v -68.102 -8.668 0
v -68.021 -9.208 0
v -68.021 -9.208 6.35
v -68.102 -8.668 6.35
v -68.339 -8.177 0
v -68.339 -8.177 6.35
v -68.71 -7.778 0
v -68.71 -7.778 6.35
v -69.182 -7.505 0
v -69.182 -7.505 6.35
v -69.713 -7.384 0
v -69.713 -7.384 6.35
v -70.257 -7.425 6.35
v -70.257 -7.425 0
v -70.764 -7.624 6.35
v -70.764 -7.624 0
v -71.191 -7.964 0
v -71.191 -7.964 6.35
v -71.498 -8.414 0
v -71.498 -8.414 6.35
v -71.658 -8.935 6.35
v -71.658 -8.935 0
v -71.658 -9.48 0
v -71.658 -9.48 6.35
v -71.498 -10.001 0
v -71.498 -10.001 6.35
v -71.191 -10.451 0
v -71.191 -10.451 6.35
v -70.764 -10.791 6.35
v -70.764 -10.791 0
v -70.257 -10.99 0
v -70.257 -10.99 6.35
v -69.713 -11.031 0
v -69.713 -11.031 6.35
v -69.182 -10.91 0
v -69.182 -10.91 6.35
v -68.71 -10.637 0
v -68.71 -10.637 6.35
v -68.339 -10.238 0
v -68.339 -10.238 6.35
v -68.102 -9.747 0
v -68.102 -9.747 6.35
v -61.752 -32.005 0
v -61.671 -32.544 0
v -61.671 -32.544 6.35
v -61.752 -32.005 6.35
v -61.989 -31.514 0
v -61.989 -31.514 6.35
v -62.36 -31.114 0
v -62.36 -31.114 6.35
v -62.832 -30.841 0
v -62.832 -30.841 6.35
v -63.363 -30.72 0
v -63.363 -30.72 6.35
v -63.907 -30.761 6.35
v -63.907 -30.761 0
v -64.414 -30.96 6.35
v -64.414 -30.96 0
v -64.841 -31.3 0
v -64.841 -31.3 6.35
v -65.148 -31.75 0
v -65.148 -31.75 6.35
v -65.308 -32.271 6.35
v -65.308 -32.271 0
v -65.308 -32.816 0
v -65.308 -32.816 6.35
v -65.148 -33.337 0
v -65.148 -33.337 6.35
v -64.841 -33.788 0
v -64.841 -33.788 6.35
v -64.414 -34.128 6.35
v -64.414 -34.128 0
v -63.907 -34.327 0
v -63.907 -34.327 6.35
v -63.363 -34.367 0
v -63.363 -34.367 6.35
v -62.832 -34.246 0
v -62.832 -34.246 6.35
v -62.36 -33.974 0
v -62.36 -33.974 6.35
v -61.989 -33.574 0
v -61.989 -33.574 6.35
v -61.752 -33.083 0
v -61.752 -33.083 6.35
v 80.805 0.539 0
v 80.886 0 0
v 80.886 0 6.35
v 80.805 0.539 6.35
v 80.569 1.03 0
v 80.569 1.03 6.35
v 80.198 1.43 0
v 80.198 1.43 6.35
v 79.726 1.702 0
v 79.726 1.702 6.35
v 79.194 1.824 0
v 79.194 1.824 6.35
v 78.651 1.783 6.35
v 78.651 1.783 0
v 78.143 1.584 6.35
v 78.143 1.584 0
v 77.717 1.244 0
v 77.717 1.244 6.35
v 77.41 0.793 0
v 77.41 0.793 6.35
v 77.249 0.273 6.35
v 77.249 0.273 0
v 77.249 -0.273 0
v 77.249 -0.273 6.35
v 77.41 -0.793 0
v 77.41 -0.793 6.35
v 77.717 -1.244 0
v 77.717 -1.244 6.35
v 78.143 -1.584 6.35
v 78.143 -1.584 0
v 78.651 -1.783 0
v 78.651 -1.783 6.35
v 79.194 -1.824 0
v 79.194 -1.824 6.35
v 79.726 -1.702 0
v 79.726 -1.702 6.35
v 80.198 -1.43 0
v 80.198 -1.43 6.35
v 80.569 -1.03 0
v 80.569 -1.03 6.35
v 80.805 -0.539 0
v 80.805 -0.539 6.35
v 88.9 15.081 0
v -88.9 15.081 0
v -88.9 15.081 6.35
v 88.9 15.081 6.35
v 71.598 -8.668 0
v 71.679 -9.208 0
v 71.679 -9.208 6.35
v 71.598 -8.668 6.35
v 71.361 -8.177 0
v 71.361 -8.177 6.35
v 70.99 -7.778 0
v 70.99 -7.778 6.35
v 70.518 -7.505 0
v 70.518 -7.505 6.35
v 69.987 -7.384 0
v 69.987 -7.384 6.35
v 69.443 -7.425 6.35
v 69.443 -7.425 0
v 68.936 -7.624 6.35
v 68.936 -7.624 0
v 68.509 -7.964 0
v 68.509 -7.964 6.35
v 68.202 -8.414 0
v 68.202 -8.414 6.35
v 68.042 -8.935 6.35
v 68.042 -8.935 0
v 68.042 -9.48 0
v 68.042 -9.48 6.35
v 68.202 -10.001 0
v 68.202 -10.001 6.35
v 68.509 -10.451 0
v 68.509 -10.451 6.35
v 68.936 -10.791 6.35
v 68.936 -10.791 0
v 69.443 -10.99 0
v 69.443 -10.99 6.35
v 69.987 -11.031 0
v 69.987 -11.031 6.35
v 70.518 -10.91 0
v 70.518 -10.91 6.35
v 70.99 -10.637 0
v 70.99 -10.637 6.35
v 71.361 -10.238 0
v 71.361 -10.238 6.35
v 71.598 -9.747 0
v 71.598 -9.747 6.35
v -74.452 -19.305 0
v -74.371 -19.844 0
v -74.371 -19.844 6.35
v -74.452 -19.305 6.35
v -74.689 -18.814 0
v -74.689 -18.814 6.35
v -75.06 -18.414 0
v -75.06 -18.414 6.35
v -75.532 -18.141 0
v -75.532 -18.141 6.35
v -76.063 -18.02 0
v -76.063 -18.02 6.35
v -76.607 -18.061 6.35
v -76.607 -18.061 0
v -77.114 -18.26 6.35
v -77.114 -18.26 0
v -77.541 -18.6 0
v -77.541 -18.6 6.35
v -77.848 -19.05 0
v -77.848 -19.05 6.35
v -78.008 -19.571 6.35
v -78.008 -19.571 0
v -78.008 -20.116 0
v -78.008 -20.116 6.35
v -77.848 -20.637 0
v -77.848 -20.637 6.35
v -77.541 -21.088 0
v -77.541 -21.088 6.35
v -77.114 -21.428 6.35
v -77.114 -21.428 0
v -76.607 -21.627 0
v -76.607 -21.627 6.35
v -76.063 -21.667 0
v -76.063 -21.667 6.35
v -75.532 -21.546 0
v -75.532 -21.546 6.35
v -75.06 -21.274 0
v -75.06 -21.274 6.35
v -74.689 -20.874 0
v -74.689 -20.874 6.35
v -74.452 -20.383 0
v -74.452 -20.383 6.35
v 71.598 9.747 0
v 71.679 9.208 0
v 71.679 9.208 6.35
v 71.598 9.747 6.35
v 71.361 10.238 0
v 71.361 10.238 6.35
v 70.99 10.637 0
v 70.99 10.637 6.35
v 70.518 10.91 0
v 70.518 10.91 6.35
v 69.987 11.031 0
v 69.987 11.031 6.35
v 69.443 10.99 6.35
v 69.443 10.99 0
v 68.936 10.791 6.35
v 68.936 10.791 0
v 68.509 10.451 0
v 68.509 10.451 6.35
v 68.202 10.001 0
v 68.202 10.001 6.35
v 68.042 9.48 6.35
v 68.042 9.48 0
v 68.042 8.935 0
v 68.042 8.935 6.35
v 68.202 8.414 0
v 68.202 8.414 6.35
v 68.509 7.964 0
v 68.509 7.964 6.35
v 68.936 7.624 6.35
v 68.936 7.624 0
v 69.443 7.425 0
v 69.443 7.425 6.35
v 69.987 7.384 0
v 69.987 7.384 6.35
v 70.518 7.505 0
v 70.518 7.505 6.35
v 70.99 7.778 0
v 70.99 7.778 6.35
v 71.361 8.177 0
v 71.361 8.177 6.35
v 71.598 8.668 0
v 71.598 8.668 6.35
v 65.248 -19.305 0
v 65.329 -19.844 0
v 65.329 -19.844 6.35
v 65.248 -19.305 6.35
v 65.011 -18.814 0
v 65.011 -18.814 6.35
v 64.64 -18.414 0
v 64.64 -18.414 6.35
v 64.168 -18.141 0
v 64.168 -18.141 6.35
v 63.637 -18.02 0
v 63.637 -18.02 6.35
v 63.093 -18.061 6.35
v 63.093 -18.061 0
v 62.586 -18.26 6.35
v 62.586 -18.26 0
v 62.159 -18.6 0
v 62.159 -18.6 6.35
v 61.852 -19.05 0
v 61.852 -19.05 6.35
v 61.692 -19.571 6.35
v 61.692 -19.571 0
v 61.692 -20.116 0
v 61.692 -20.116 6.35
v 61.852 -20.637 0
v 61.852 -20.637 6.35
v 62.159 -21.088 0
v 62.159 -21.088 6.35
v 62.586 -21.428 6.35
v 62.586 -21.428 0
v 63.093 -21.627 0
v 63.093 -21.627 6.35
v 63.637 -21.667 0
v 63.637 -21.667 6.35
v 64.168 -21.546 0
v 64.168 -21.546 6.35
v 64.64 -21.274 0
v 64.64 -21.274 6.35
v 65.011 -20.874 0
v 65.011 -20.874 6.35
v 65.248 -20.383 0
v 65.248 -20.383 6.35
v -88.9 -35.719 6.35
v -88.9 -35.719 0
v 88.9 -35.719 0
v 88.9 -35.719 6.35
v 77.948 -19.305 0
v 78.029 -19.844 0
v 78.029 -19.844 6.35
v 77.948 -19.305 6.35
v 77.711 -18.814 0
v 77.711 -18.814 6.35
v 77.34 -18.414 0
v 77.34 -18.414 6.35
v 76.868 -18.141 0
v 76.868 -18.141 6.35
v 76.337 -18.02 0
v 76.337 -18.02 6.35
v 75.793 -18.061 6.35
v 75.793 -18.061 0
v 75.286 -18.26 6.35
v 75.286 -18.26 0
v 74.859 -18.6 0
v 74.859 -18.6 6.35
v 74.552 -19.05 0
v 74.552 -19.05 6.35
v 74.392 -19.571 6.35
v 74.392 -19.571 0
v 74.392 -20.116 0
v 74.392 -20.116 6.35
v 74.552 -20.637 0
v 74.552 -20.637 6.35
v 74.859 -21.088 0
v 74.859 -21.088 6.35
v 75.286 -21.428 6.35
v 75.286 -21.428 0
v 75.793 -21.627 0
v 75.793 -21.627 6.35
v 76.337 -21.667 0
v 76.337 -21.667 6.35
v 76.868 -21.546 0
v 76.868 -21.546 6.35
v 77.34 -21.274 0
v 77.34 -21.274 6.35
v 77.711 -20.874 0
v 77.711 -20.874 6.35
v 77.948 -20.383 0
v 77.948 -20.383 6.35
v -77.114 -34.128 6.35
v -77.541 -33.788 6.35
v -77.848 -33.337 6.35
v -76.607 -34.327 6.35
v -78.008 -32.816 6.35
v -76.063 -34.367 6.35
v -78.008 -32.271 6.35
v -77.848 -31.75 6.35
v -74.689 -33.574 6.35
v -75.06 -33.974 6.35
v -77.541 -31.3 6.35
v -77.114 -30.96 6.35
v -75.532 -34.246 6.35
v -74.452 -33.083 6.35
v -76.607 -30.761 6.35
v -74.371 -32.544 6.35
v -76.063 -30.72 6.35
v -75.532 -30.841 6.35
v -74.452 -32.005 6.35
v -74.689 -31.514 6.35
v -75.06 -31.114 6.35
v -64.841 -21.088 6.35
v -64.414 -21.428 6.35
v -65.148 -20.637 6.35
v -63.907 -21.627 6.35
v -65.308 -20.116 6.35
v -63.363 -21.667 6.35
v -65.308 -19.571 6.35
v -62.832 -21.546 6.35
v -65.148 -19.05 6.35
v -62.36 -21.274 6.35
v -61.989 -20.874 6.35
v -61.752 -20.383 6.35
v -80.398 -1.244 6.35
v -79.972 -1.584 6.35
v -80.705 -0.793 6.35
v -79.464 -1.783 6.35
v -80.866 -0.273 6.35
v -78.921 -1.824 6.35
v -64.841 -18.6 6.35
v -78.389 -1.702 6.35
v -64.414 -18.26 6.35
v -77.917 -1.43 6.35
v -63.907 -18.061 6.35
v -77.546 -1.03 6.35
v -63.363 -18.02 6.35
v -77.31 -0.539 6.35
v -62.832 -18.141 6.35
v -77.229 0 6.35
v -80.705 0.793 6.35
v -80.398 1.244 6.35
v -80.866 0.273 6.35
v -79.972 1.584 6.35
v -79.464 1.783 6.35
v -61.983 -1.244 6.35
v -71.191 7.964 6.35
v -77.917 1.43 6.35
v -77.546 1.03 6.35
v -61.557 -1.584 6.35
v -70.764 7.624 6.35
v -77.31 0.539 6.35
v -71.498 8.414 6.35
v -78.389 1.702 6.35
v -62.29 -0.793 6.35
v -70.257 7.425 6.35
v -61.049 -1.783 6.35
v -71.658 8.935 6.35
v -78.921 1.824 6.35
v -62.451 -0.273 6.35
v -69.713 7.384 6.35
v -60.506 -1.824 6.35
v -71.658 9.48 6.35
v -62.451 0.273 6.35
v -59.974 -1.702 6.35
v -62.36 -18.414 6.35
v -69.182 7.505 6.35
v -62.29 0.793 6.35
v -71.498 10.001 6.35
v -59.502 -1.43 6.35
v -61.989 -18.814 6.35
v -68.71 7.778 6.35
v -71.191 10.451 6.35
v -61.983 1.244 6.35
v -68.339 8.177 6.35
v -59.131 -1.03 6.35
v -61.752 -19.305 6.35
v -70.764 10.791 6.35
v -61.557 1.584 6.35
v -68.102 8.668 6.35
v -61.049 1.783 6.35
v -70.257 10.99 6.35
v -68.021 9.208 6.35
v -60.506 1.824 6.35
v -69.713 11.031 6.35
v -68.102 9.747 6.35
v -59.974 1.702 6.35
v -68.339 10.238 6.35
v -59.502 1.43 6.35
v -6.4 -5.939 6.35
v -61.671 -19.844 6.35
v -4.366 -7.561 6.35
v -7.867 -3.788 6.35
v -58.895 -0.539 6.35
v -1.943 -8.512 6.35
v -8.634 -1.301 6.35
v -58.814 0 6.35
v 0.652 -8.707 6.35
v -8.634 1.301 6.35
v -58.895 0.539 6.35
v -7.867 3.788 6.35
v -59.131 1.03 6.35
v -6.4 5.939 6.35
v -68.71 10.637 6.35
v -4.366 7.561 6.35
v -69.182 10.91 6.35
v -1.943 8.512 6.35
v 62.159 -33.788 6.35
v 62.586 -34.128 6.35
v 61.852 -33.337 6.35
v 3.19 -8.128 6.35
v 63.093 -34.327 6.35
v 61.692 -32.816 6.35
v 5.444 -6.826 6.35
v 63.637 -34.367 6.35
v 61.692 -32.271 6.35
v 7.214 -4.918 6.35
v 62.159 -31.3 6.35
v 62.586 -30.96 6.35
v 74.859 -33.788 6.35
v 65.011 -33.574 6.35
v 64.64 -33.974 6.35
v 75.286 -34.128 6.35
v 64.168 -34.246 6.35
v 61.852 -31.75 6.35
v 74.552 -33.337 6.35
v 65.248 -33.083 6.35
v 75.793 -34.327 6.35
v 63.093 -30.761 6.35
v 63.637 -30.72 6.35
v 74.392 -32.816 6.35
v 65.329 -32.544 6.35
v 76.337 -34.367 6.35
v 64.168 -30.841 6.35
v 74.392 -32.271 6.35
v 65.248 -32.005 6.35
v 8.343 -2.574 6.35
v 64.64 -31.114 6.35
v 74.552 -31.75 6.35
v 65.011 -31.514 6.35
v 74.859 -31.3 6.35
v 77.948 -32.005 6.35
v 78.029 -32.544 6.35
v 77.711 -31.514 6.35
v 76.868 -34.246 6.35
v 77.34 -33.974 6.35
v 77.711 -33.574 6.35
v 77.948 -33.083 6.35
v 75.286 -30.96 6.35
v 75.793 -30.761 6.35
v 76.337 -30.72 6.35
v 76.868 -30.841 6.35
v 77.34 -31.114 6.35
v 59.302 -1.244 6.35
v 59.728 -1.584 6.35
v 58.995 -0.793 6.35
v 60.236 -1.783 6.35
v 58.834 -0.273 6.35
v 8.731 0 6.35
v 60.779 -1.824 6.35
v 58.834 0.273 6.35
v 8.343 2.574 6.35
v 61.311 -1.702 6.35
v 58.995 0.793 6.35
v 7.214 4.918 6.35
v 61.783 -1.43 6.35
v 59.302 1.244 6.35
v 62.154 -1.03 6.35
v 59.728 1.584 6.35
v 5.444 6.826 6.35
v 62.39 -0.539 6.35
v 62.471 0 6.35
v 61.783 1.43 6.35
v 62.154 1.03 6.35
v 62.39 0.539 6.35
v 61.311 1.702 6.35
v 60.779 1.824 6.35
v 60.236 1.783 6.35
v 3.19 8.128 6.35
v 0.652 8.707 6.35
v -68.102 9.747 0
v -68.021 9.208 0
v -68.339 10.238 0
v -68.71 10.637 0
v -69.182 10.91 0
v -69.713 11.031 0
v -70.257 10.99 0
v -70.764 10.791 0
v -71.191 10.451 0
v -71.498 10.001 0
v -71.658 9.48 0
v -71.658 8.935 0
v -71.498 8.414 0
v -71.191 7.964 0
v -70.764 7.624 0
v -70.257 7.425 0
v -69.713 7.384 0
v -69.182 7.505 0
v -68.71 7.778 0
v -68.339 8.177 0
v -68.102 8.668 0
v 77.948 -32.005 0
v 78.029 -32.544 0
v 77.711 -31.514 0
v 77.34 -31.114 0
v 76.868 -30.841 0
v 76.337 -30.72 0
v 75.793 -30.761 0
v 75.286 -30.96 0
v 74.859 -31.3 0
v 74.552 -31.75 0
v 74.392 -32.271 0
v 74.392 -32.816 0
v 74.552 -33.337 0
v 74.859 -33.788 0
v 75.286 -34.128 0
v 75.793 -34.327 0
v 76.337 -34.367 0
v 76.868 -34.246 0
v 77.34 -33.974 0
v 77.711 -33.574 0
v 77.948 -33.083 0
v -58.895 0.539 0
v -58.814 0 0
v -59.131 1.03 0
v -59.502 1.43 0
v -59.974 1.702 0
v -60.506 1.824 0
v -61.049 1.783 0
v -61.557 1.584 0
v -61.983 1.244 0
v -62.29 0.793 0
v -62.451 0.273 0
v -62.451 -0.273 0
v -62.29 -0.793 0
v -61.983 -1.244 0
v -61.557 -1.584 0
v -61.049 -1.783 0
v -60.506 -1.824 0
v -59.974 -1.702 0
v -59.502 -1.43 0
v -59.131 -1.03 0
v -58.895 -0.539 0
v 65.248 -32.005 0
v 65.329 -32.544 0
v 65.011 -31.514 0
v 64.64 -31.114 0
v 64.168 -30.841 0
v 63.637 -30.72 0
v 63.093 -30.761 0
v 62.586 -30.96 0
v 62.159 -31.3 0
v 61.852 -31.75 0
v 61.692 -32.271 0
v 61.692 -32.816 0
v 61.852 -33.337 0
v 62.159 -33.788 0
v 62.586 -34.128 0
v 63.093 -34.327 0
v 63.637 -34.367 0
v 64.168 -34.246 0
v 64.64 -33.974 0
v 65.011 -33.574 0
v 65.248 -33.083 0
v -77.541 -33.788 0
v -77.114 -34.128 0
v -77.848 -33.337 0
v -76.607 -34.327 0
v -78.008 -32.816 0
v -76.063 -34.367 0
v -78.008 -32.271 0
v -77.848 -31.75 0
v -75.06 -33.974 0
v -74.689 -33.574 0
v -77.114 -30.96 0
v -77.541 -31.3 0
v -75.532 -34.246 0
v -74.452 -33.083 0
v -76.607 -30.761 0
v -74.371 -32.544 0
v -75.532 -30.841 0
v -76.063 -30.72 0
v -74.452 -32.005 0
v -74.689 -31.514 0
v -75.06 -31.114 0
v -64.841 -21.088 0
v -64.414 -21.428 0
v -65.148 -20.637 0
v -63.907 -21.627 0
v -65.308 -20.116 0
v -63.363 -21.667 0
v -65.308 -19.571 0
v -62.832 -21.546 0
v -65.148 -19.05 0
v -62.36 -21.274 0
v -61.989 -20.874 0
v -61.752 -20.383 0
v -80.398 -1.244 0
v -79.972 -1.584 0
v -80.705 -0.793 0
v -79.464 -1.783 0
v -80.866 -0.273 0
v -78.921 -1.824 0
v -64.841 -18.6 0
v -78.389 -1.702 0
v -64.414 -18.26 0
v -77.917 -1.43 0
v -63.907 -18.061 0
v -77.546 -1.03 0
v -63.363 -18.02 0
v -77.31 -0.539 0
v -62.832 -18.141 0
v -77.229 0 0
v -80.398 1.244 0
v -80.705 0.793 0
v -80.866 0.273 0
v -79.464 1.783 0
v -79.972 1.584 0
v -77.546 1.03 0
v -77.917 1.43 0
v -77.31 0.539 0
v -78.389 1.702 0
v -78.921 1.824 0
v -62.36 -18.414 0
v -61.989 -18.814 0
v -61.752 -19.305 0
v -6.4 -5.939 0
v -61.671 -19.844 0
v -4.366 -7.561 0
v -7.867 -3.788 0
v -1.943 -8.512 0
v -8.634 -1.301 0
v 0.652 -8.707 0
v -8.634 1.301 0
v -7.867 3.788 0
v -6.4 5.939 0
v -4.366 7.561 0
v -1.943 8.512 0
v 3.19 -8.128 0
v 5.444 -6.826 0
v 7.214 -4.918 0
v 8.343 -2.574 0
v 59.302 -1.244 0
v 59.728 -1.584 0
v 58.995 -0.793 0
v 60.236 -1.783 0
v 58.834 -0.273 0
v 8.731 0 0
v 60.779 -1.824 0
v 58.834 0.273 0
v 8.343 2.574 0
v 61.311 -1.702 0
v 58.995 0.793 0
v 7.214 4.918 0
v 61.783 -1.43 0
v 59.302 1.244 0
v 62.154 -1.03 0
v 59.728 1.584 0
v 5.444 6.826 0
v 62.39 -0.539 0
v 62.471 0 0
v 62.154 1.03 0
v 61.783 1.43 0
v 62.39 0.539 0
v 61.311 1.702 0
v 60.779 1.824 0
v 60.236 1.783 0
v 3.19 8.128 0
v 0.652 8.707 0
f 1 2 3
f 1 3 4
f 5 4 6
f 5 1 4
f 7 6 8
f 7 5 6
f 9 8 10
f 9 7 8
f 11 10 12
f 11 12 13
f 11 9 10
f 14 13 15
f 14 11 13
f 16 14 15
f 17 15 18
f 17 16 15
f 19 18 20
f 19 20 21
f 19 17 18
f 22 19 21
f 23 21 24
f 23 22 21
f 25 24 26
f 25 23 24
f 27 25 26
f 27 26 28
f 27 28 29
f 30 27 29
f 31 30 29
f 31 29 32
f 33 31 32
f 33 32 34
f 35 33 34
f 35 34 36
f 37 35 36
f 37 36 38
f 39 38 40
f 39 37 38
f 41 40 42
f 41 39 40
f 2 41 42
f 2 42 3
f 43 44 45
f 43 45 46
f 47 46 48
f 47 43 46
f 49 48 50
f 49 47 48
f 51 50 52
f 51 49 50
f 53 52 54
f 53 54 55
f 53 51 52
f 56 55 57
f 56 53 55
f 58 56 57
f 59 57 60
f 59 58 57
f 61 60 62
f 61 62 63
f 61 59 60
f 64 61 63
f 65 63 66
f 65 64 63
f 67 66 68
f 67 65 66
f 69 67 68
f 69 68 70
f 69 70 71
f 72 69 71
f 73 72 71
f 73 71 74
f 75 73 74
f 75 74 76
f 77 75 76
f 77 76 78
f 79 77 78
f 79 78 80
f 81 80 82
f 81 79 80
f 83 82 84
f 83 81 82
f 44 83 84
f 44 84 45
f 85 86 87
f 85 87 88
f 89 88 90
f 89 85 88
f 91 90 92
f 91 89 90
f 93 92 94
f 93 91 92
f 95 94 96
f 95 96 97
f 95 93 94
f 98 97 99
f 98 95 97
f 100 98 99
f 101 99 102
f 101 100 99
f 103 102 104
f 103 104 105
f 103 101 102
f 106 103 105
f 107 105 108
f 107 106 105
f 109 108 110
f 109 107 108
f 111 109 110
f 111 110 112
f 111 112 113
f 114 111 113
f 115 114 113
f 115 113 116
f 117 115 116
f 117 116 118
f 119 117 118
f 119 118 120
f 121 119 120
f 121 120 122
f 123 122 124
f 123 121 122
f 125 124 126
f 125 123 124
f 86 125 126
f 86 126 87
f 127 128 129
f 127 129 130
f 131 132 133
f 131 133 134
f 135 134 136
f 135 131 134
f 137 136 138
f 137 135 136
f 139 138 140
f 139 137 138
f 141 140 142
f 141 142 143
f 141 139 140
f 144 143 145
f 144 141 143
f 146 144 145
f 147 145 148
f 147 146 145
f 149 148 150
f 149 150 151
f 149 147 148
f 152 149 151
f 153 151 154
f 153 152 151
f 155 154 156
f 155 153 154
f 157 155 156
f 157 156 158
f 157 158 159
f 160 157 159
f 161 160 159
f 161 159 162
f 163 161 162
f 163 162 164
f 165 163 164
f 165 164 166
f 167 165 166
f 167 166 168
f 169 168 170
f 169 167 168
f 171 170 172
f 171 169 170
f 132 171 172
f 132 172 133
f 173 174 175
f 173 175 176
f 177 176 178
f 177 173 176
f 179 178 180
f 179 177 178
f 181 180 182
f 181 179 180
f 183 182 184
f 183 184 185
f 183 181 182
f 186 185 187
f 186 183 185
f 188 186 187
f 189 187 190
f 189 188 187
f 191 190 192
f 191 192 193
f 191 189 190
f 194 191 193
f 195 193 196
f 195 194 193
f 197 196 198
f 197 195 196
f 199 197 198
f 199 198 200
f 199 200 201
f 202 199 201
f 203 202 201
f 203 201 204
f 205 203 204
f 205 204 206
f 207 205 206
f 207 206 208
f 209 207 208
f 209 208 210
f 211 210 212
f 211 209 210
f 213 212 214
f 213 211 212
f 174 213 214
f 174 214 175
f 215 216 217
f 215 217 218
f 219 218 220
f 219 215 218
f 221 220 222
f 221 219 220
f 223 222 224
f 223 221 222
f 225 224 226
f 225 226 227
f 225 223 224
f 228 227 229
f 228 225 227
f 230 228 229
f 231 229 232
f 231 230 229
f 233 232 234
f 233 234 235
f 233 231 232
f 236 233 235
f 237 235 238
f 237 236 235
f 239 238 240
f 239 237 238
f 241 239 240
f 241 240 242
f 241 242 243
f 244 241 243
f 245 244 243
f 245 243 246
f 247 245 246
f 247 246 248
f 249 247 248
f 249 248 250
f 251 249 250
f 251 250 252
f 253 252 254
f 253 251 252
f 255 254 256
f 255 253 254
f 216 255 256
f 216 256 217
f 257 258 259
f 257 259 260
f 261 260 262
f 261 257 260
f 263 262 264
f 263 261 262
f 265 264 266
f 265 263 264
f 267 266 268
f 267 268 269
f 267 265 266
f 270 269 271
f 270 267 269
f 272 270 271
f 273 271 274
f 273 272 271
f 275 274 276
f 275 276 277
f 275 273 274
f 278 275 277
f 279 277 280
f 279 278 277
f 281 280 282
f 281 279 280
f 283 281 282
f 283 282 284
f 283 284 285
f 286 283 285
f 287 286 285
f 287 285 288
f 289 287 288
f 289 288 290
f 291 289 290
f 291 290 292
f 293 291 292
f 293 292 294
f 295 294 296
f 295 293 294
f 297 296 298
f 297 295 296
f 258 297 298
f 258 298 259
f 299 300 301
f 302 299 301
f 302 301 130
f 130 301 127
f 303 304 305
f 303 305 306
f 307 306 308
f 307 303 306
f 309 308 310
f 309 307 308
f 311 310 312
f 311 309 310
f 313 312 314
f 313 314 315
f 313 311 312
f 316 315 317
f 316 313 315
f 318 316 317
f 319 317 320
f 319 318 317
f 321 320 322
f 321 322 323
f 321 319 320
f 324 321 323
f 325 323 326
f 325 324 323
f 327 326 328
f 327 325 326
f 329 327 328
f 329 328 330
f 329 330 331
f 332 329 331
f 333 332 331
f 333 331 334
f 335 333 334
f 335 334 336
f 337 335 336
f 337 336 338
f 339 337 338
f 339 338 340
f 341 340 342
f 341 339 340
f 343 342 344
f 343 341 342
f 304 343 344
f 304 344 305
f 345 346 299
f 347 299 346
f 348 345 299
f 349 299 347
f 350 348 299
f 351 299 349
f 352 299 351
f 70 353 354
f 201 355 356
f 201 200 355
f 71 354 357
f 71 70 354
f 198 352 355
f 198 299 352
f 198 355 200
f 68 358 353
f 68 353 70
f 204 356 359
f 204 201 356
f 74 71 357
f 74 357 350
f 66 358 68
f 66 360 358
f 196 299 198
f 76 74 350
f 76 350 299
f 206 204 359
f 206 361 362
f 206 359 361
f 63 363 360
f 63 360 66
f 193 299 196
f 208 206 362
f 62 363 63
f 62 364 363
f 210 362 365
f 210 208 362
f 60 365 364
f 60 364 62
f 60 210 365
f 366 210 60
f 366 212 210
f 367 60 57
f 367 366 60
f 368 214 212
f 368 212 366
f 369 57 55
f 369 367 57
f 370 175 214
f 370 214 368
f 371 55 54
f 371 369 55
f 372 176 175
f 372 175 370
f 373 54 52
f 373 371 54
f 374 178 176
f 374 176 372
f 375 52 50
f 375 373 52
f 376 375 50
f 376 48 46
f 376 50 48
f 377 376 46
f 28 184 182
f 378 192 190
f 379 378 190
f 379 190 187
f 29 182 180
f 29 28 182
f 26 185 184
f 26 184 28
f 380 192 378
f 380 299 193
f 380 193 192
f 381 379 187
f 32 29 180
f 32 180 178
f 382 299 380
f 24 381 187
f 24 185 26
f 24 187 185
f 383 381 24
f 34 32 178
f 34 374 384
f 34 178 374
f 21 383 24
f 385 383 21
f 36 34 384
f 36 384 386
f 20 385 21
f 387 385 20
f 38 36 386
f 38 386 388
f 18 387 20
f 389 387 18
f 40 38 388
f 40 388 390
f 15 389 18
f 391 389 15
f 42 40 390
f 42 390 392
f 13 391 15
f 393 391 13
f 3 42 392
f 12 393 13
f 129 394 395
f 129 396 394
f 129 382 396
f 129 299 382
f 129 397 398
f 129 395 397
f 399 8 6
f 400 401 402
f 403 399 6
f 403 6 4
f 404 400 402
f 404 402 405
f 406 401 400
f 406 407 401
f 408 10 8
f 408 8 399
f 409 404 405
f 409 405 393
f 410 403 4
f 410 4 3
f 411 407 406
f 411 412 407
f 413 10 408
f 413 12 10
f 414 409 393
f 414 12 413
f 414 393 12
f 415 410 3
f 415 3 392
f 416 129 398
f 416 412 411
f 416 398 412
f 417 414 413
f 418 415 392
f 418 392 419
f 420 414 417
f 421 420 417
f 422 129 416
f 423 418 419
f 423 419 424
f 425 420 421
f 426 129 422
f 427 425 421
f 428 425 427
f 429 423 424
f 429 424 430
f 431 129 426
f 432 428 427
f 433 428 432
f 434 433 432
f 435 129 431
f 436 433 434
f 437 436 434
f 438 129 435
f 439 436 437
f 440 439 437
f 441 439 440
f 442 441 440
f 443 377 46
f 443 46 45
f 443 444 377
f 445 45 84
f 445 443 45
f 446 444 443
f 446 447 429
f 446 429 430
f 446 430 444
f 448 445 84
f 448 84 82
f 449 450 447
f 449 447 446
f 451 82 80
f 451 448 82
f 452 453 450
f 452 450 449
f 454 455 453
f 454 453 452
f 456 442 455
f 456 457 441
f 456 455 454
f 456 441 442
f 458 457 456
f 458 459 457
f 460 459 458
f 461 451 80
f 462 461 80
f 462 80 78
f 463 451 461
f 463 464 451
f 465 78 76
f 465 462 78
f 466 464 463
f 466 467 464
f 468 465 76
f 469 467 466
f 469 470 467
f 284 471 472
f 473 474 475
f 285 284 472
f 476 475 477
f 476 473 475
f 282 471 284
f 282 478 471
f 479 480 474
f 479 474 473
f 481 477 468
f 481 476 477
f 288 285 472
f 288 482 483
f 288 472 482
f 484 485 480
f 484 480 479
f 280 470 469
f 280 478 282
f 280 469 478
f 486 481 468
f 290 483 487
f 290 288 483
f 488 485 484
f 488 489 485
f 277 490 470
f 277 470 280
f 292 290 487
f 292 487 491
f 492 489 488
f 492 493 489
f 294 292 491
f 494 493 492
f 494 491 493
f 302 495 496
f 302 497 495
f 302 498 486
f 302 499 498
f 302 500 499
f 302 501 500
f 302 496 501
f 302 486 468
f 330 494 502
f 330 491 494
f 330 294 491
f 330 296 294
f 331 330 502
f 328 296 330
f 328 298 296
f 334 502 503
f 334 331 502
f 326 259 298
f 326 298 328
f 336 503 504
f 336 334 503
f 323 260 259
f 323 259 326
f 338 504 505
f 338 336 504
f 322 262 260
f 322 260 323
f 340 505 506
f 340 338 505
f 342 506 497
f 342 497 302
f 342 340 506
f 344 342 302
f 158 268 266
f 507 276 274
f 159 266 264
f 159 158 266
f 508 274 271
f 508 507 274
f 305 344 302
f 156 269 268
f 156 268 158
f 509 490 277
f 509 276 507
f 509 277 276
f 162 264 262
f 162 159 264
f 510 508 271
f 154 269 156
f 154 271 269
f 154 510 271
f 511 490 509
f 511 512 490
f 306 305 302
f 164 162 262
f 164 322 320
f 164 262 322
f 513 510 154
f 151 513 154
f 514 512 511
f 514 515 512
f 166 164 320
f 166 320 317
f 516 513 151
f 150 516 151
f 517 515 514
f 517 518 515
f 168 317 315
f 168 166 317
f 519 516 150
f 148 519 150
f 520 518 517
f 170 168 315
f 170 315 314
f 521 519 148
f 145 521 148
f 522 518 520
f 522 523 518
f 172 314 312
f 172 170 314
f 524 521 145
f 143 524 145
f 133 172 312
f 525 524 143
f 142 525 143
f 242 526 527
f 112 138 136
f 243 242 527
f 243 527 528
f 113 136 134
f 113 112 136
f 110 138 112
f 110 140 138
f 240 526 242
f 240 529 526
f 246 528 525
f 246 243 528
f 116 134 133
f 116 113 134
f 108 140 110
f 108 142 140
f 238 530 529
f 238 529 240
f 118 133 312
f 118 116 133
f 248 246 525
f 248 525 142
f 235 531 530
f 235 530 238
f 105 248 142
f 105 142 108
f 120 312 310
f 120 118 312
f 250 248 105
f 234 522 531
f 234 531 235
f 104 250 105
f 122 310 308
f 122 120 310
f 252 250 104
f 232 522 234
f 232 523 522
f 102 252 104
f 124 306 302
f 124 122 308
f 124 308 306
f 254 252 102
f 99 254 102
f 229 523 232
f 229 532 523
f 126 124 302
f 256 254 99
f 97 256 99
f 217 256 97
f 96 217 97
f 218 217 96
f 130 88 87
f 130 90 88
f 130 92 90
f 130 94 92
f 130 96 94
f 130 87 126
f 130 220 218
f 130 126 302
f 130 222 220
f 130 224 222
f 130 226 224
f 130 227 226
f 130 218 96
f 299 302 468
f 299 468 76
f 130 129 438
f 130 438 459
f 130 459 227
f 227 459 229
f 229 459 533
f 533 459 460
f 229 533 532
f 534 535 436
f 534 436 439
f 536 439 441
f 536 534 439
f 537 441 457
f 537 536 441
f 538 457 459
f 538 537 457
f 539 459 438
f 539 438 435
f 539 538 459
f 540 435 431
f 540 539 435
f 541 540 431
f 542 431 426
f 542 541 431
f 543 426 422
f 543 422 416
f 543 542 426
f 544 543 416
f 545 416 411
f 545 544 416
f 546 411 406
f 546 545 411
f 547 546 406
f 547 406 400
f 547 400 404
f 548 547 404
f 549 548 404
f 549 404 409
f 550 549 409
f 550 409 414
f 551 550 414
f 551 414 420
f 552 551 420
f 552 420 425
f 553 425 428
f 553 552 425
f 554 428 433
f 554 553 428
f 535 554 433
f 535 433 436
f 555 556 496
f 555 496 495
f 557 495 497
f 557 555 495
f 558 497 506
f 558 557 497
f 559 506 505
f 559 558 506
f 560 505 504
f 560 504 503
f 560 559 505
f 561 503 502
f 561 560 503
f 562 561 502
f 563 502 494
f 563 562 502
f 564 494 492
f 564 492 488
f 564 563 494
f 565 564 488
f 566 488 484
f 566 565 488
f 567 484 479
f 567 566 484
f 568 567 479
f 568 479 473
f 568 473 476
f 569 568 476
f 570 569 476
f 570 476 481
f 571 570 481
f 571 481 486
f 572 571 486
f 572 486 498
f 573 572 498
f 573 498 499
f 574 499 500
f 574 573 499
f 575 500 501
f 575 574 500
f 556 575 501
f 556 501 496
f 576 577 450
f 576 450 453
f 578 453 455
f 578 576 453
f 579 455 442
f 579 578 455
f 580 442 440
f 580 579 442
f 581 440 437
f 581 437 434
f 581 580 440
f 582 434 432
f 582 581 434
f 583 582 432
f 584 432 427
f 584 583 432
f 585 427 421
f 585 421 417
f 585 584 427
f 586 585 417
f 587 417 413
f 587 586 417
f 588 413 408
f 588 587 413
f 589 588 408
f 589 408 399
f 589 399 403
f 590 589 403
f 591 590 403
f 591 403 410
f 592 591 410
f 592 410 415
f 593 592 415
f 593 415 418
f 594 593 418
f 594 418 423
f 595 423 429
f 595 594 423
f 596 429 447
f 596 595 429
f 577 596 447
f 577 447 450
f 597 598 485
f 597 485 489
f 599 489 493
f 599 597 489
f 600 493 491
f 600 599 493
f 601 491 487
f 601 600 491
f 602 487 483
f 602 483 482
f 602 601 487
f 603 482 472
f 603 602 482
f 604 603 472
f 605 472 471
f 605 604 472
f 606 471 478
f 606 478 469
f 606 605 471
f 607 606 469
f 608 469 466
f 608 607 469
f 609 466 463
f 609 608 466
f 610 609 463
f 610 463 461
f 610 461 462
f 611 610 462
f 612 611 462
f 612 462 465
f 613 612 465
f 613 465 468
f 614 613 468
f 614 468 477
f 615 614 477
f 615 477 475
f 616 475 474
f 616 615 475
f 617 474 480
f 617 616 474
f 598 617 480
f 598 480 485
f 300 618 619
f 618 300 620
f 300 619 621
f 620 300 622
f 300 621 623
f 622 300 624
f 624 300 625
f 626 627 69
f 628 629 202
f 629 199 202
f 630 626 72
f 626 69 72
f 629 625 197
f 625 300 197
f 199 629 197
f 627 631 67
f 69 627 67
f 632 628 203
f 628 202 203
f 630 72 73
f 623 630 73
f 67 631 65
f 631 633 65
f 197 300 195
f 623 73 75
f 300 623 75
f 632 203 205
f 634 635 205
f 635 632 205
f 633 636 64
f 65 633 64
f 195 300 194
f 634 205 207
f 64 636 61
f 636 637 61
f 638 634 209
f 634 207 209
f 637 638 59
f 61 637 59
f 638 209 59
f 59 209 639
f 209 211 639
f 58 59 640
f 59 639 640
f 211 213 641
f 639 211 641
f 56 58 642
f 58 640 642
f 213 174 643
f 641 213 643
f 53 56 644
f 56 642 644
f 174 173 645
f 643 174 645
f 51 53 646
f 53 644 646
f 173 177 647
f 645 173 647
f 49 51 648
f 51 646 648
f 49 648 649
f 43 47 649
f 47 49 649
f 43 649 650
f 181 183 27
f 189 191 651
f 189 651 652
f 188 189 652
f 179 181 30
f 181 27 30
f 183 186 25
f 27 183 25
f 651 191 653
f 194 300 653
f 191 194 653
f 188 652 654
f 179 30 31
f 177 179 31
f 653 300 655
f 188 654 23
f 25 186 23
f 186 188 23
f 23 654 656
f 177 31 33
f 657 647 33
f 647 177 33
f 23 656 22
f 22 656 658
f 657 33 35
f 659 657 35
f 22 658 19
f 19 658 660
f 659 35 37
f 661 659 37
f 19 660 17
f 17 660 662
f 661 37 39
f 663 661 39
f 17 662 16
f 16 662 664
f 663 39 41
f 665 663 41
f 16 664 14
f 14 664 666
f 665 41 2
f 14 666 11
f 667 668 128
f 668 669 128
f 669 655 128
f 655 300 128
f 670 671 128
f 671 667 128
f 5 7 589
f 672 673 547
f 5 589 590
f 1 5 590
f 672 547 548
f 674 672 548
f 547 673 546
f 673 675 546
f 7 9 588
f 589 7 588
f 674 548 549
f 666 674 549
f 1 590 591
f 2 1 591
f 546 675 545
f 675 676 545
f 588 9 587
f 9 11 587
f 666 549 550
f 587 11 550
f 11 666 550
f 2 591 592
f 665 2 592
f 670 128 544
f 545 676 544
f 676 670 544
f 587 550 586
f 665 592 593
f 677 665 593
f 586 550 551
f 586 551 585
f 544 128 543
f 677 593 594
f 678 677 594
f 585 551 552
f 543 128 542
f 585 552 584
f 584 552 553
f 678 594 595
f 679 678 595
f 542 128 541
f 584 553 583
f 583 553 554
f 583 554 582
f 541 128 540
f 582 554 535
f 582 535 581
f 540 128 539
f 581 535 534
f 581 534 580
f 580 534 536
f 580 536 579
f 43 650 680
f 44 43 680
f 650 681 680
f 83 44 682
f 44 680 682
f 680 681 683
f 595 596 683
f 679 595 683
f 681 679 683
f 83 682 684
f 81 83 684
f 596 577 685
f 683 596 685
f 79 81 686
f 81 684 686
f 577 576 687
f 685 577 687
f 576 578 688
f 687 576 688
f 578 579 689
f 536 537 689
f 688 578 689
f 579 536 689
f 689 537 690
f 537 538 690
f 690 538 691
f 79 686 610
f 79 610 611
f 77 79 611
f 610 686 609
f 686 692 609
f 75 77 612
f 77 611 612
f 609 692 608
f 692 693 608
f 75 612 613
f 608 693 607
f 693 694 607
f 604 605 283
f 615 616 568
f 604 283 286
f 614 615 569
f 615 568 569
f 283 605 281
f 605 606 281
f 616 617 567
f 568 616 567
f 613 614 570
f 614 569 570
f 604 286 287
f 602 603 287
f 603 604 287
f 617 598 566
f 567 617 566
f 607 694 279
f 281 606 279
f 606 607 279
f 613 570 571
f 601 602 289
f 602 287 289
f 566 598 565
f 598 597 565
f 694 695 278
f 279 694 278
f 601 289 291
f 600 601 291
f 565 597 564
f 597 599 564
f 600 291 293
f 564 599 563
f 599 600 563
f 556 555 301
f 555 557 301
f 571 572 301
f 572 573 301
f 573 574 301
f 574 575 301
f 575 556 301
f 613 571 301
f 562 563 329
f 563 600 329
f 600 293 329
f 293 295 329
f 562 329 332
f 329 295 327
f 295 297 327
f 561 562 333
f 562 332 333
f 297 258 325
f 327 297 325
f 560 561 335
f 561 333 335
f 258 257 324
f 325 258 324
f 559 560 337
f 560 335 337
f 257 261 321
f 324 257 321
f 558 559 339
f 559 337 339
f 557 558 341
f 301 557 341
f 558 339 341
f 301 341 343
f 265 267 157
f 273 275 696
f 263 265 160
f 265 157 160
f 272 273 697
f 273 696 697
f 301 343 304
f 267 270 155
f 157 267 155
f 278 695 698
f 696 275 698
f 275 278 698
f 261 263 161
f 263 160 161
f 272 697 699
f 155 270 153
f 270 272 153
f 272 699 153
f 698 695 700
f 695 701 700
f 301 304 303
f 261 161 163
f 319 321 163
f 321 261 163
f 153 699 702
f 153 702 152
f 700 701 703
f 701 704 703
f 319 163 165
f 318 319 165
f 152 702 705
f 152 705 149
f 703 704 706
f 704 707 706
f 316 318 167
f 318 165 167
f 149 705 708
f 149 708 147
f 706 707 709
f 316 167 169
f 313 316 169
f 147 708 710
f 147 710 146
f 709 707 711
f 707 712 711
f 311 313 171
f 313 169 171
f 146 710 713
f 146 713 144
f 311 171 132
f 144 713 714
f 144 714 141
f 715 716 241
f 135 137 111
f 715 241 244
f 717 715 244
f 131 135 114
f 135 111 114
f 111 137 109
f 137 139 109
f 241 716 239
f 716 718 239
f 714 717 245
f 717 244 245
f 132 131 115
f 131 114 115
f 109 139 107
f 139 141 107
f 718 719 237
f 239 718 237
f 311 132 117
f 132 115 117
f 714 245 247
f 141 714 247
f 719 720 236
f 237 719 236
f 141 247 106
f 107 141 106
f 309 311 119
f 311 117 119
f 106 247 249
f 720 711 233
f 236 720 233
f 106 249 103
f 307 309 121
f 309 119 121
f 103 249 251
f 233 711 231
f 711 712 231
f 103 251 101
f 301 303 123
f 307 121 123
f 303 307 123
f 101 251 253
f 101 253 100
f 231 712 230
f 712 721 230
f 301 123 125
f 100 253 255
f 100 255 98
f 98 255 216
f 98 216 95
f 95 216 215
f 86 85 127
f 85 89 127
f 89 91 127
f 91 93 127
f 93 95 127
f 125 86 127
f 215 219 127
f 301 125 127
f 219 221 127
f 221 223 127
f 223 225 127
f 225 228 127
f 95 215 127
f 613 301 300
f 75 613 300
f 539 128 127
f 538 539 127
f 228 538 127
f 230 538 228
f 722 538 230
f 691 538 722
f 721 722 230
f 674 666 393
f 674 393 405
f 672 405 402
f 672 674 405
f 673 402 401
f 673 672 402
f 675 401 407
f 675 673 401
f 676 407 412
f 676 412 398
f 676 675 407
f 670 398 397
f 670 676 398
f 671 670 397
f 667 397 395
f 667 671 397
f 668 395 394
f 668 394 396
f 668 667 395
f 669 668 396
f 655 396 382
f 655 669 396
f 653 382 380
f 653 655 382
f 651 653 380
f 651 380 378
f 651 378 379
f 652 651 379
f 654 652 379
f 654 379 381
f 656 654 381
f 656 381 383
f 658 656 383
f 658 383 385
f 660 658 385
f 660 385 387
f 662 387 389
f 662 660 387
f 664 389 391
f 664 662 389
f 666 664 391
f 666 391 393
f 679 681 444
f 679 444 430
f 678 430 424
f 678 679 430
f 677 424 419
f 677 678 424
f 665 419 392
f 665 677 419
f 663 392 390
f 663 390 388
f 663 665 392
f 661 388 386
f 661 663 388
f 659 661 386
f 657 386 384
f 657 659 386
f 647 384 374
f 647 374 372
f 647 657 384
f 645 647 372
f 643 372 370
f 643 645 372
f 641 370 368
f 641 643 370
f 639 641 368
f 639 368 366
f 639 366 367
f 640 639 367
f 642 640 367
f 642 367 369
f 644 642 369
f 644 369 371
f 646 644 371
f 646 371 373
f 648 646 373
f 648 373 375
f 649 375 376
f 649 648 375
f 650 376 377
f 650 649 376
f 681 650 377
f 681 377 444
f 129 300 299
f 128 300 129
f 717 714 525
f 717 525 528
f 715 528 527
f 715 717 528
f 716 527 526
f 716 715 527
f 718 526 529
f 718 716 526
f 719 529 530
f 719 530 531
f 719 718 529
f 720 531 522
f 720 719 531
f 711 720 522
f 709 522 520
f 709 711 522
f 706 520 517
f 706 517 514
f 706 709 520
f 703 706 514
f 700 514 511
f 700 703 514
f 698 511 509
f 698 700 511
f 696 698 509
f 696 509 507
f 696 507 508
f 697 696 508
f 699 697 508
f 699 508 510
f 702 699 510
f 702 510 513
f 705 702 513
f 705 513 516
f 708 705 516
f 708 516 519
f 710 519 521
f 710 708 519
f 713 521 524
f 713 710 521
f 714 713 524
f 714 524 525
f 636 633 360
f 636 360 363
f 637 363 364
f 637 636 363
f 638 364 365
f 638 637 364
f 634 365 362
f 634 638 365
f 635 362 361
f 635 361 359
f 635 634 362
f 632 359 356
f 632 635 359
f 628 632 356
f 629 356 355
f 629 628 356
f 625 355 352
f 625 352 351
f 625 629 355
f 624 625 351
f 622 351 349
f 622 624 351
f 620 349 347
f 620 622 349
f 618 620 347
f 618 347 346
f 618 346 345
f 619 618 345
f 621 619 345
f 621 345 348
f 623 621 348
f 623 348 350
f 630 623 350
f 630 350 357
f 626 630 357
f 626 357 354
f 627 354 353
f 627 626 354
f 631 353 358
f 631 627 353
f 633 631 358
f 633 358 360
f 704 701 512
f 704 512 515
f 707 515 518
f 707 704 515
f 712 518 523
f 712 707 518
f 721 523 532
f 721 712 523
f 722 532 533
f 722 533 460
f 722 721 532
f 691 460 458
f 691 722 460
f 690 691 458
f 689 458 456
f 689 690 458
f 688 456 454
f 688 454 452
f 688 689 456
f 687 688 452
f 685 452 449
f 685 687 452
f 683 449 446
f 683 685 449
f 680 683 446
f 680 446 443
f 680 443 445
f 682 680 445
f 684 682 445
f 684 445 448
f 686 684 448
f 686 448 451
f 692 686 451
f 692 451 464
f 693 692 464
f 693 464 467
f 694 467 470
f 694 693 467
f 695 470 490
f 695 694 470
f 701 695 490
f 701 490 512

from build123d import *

# Parameters (mm, degrees)
SKETCH1_W           = 177.8
SKETCH1_H           = 50.8
SKETCH1_R           = 8.73125
SKETCH1_R_2         = 1.8288
BOSS_EXTRUDE1_DEPTH = 6.35


with BuildPart() as part:
    # Sketch1 → Boss-Extrude1 (new body)
    with BuildSketch(Plane.XY):
        with Locations((0, -10.31875)):
            Rectangle(SKETCH1_W, SKETCH1_H)
        Circle(SKETCH1_R, mode=Mode.SUBTRACT)
        with Locations((-79.0575, 0)):
            Circle(SKETCH1_R_2, mode=Mode.SUBTRACT)
        with Locations((-60.6425, 0)):
            Circle(SKETCH1_R_2, mode=Mode.SUBTRACT)
        with Locations((60.6425, 0)):
            Circle(SKETCH1_R_2, mode=Mode.SUBTRACT)
        with Locations((79.0575, 0)):
            Circle(SKETCH1_R_2, mode=Mode.SUBTRACT)
        with Locations((69.85, 9.2075)):
            Circle(SKETCH1_R_2, mode=Mode.SUBTRACT)
        with Locations((69.85, -9.2075)):
            Circle(SKETCH1_R_2, mode=Mode.SUBTRACT)
        with Locations((-69.85, 9.2075)):
            Circle(SKETCH1_R_2, mode=Mode.SUBTRACT)
        with Locations((-69.85, -9.2075)):
            Circle(SKETCH1_R_2, mode=Mode.SUBTRACT)
        with Locations((-76.2, -19.84375)):
            Circle(SKETCH1_R_2, mode=Mode.SUBTRACT)
        with Locations((-63.5, -19.84375)):
            Circle(SKETCH1_R_2, mode=Mode.SUBTRACT)
        with Locations((-63.5, -32.54375)):
            Circle(SKETCH1_R_2, mode=Mode.SUBTRACT)
        with Locations((-76.2, -32.54375)):
            Circle(SKETCH1_R_2, mode=Mode.SUBTRACT)
        with Locations((63.5, -19.84375)):
            Circle(SKETCH1_R_2, mode=Mode.SUBTRACT)
        with Locations((76.2, -19.84375)):
            Circle(SKETCH1_R_2, mode=Mode.SUBTRACT)
        with Locations((76.2, -32.54375)):
            Circle(SKETCH1_R_2, mode=Mode.SUBTRACT)
        with Locations((63.5, -32.54375)):
            Circle(SKETCH1_R_2, mode=Mode.SUBTRACT)
    extrude(amount=BOSS_EXTRUDE1_DEPTH)


solid = part.part
